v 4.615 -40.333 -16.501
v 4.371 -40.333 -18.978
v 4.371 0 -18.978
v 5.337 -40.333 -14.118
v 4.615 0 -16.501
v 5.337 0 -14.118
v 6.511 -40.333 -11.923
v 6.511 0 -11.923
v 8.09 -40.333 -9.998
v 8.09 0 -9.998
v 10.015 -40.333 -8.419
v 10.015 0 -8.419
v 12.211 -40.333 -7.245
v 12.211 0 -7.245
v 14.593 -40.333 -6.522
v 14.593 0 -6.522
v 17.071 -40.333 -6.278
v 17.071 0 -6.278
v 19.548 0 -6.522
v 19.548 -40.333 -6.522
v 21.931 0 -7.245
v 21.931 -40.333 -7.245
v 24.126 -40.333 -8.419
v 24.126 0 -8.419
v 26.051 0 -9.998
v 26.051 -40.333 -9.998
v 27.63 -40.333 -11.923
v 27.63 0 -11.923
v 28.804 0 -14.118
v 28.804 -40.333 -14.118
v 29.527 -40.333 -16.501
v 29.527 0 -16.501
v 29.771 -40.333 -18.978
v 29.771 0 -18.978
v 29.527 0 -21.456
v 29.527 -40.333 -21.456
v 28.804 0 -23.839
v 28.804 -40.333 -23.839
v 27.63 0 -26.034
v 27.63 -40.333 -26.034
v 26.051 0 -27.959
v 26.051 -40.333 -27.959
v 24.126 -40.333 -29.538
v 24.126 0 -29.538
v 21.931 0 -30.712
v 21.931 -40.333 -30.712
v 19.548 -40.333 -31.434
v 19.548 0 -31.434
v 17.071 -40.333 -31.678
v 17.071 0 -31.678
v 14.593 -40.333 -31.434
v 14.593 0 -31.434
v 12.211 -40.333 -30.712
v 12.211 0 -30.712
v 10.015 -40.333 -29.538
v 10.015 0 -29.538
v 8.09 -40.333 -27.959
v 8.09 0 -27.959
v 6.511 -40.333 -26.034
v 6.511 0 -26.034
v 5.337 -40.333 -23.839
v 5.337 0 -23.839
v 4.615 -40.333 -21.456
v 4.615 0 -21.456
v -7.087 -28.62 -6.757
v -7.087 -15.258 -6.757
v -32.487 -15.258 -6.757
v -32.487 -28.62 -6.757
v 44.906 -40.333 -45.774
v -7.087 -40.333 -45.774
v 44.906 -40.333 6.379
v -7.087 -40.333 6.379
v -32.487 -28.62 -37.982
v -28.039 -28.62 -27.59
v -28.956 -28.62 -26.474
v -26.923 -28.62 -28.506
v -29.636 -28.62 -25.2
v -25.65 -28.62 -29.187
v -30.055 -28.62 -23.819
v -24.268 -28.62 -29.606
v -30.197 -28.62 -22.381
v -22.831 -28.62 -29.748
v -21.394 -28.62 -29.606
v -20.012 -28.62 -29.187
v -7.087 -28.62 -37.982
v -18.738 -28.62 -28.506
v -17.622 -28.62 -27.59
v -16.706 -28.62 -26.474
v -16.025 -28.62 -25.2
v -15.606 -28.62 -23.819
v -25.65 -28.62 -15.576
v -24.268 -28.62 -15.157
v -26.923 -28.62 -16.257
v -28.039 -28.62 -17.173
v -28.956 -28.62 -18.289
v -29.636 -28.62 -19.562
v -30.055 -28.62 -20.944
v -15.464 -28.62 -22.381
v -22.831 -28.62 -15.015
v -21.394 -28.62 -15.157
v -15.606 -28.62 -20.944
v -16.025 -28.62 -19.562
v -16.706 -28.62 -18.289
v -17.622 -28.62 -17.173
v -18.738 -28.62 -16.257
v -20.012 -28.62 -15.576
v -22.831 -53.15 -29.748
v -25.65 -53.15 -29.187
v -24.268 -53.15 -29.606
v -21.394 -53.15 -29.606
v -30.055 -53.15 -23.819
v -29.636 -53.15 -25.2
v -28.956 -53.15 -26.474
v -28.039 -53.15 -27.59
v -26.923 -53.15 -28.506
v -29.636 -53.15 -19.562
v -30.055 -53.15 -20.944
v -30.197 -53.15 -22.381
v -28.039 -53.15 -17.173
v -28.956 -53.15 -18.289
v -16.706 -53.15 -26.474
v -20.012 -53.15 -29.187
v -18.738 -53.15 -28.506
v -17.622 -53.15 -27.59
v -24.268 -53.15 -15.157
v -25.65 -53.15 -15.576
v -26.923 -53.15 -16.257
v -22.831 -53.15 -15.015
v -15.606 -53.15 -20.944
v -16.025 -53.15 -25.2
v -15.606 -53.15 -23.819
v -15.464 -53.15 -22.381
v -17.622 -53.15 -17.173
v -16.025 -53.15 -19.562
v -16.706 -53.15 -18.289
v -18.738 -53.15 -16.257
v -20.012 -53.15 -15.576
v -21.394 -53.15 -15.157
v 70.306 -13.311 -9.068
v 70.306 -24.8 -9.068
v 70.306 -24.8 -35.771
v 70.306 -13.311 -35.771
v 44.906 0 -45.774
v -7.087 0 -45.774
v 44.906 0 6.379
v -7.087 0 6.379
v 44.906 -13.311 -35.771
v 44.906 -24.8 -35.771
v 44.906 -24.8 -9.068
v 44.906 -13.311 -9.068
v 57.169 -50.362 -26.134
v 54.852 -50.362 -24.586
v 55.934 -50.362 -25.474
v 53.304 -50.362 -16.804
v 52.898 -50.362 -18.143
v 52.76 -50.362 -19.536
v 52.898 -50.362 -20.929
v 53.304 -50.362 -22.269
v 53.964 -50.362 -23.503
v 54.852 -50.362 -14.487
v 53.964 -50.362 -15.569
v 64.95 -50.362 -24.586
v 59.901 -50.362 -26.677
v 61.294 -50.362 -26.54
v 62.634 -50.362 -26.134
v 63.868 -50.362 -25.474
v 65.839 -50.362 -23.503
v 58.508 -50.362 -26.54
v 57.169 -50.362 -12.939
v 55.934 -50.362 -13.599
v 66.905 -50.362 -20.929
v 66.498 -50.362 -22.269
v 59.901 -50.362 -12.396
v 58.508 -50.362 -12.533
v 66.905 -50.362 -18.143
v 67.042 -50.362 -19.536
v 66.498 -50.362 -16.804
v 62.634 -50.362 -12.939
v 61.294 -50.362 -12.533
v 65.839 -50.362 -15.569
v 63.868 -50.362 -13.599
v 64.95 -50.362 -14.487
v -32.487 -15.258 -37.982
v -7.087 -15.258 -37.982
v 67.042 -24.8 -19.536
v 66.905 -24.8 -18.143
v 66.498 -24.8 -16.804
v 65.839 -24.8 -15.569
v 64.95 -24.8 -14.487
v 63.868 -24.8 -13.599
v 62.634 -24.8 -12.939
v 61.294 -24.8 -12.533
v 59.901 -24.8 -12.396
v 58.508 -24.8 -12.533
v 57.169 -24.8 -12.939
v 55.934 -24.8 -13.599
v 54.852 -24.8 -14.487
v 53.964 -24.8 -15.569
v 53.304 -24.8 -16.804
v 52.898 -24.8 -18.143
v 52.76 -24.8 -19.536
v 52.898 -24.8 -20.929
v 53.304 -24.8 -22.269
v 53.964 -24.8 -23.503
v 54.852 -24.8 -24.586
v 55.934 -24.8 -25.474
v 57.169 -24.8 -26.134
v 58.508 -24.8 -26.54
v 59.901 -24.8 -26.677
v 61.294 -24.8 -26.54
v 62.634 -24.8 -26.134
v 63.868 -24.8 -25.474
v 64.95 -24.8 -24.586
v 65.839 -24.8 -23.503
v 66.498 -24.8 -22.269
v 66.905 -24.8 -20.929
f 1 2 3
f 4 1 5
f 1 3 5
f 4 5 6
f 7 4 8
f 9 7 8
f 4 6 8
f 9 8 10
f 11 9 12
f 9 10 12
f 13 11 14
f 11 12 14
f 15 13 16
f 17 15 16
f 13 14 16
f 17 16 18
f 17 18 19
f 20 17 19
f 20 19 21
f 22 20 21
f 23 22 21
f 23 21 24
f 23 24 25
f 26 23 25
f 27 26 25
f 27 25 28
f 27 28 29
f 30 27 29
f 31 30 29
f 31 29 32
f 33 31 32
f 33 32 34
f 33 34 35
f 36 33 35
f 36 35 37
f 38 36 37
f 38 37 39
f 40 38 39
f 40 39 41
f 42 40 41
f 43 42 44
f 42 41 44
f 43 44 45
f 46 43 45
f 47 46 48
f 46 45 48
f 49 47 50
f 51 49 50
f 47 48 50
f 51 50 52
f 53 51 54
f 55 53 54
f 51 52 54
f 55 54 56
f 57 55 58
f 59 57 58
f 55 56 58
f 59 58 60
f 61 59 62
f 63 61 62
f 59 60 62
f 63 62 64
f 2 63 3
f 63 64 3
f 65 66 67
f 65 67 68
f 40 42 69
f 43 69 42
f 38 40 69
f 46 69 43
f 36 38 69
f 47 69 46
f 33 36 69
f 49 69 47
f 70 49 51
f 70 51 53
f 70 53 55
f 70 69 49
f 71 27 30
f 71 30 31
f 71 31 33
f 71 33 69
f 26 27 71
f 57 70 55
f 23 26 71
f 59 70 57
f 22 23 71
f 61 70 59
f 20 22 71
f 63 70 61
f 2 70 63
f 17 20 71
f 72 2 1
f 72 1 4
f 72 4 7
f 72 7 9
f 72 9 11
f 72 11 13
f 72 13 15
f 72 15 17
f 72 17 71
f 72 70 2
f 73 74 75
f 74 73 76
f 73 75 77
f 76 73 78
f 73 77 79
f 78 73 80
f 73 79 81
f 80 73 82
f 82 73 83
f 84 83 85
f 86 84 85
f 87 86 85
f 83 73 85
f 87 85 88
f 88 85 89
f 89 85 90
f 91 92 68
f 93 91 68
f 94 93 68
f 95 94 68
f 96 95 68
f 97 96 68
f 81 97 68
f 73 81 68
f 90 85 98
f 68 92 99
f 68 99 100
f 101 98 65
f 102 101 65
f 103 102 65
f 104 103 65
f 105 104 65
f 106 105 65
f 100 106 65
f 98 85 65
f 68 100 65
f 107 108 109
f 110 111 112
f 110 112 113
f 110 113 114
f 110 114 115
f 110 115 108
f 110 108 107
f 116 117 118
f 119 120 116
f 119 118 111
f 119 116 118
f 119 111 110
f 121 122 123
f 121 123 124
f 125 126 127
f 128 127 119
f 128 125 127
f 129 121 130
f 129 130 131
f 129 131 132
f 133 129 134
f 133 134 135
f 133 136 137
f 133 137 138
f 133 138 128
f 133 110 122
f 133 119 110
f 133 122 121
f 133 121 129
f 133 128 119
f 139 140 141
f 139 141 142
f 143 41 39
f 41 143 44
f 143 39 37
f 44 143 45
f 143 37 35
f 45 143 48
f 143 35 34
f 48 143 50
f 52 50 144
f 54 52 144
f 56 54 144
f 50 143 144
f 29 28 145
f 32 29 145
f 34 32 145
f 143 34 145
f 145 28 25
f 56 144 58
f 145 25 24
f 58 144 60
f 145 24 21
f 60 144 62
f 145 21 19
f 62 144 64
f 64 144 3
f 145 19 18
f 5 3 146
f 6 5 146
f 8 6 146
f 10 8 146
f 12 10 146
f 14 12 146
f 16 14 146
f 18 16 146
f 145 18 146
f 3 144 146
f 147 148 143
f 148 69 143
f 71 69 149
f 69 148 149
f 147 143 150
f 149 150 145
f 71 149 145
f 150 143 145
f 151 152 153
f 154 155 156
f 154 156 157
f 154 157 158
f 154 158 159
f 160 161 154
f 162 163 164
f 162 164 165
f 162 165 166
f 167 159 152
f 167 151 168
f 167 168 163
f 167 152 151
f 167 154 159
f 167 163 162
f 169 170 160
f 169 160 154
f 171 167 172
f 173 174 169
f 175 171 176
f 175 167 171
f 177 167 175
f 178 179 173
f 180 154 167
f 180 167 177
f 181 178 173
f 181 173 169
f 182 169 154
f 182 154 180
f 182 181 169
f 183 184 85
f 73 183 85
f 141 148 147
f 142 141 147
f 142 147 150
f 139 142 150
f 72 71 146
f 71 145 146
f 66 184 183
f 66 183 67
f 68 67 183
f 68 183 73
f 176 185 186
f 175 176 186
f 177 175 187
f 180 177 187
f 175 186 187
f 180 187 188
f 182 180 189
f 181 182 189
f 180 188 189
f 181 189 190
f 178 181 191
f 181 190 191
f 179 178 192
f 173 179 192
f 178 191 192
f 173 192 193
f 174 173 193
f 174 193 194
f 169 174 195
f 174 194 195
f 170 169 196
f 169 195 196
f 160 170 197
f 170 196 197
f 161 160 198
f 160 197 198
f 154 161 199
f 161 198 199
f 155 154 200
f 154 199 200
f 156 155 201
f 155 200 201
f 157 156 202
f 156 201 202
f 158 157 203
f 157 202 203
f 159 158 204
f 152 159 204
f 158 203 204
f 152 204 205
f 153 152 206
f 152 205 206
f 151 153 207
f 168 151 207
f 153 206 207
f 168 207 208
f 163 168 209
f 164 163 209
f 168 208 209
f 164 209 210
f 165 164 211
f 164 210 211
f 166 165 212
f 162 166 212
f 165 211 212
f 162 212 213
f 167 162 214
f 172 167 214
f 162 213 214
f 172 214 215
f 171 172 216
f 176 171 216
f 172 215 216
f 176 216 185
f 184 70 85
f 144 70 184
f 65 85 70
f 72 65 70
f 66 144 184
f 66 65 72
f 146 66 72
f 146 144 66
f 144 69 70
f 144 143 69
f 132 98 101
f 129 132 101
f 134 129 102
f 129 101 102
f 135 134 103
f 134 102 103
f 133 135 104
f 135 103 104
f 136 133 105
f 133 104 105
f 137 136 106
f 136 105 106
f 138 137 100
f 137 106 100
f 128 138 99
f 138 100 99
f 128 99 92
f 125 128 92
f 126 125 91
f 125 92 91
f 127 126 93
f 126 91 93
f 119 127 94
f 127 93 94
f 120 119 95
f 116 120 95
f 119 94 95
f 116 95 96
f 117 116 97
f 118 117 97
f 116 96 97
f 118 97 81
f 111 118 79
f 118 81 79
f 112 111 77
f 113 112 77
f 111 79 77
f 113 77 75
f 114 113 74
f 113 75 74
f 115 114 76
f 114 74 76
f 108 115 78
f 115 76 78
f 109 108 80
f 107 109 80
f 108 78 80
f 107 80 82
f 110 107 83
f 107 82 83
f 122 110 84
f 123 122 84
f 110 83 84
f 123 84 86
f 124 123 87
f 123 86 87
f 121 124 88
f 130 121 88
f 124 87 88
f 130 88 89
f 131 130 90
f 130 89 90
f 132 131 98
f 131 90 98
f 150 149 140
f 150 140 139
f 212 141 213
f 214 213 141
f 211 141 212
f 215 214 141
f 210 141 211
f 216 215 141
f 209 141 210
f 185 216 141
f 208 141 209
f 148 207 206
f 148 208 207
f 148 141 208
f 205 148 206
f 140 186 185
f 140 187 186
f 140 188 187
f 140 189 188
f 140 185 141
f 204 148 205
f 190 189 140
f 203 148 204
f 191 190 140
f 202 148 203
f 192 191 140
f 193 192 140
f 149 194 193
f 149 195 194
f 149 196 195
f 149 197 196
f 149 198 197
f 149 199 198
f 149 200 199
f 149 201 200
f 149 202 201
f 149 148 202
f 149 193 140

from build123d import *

# Parameters (mm, degrees)
F0_W      = 26.593355462
F0_H      = 52.1527305245
F1_DEPTH  = 25.4
F2_DEPTH  = 25.4
F3_DEPTH  = 14.93277587
F6_D      = 25.4
F8_W      = 11.4883370697
F8_H      = 26.7024151981
F9_DEPTH  = 25.4
F10_W     = 13.3622530848
F10_H     = 31.2255714089
F11_DEPTH = 25.4
F12_R     = 7.1407496184
F13_DEPTH = 25.5624204874
F14_R     = 7.3663727873
F15_DEPTH = 24.5301295072


with BuildPart() as f1:
    # F0 (on Front) → F1 (new body)
    with BuildSketch(Plane.XZ):
        with Locations((6.2094768509, -19.6972563863)):
            Rectangle(F0_W, F0_H)
    extrude(amount=F1_DEPTH)

    # F2 (add): a face of the model
    f2_faces = [f1.faces().sort_by_distance(p)[0] for p in [
        (19.5061545819, -12.7, -19.6972563863),
    ]]
    extrude(f2_faces, amount=F2_DEPTH)

    # F3 (add): a face of the model
    f3_faces = [f1.faces().sort_by_distance(p)[0] for p in [
        (18.9094768509, -25.4, -19.6972563863),
    ]]
    extrude(f3_faces, amount=F3_DEPTH)

    # F6 (through all)
    with Locations(Plane.XZ.offset(40.33277587)):
        with Locations((17.0706212521, -18.9784392715)):
            Hole(F6_D / 2)

    # F8 (on face) → F9 (join)
    with BuildSketch(Plane.YZ.offset(44.9061545819)):
        with Locations((-19.0554484725, -22.4194079638)):
            Rectangle(F8_W, F8_H)
    extrude(amount=F9_DEPTH)

    # F10 (on face) → F11 (join)
    with BuildSketch(Plane(origin=(-7.0872008801, 0, 0), x_dir=(0, -1, 0), z_dir=(-1, 0, 0))):
        with Locations((21.9391398132, -22.3693735898)):
            Rectangle(F10_W, F10_H)
    extrude(amount=F11_DEPTH)

    # F12 (on face) → F13 (join)
    with BuildSketch(Plane.XZ.offset(24.7996170074)):
        with Locations((59.9011927843, -19.5363089442)):
            Circle(F12_R)
    extrude(amount=F13_DEPTH)

    # F14 (on face) → F15 (join)
    with BuildSketch(Plane.XZ.offset(28.6202663556)):
        with Locations((-22.8306427598, -22.3814845085)):
            Circle(F14_R)
    extrude(amount=F15_DEPTH)


solid = f1.part
